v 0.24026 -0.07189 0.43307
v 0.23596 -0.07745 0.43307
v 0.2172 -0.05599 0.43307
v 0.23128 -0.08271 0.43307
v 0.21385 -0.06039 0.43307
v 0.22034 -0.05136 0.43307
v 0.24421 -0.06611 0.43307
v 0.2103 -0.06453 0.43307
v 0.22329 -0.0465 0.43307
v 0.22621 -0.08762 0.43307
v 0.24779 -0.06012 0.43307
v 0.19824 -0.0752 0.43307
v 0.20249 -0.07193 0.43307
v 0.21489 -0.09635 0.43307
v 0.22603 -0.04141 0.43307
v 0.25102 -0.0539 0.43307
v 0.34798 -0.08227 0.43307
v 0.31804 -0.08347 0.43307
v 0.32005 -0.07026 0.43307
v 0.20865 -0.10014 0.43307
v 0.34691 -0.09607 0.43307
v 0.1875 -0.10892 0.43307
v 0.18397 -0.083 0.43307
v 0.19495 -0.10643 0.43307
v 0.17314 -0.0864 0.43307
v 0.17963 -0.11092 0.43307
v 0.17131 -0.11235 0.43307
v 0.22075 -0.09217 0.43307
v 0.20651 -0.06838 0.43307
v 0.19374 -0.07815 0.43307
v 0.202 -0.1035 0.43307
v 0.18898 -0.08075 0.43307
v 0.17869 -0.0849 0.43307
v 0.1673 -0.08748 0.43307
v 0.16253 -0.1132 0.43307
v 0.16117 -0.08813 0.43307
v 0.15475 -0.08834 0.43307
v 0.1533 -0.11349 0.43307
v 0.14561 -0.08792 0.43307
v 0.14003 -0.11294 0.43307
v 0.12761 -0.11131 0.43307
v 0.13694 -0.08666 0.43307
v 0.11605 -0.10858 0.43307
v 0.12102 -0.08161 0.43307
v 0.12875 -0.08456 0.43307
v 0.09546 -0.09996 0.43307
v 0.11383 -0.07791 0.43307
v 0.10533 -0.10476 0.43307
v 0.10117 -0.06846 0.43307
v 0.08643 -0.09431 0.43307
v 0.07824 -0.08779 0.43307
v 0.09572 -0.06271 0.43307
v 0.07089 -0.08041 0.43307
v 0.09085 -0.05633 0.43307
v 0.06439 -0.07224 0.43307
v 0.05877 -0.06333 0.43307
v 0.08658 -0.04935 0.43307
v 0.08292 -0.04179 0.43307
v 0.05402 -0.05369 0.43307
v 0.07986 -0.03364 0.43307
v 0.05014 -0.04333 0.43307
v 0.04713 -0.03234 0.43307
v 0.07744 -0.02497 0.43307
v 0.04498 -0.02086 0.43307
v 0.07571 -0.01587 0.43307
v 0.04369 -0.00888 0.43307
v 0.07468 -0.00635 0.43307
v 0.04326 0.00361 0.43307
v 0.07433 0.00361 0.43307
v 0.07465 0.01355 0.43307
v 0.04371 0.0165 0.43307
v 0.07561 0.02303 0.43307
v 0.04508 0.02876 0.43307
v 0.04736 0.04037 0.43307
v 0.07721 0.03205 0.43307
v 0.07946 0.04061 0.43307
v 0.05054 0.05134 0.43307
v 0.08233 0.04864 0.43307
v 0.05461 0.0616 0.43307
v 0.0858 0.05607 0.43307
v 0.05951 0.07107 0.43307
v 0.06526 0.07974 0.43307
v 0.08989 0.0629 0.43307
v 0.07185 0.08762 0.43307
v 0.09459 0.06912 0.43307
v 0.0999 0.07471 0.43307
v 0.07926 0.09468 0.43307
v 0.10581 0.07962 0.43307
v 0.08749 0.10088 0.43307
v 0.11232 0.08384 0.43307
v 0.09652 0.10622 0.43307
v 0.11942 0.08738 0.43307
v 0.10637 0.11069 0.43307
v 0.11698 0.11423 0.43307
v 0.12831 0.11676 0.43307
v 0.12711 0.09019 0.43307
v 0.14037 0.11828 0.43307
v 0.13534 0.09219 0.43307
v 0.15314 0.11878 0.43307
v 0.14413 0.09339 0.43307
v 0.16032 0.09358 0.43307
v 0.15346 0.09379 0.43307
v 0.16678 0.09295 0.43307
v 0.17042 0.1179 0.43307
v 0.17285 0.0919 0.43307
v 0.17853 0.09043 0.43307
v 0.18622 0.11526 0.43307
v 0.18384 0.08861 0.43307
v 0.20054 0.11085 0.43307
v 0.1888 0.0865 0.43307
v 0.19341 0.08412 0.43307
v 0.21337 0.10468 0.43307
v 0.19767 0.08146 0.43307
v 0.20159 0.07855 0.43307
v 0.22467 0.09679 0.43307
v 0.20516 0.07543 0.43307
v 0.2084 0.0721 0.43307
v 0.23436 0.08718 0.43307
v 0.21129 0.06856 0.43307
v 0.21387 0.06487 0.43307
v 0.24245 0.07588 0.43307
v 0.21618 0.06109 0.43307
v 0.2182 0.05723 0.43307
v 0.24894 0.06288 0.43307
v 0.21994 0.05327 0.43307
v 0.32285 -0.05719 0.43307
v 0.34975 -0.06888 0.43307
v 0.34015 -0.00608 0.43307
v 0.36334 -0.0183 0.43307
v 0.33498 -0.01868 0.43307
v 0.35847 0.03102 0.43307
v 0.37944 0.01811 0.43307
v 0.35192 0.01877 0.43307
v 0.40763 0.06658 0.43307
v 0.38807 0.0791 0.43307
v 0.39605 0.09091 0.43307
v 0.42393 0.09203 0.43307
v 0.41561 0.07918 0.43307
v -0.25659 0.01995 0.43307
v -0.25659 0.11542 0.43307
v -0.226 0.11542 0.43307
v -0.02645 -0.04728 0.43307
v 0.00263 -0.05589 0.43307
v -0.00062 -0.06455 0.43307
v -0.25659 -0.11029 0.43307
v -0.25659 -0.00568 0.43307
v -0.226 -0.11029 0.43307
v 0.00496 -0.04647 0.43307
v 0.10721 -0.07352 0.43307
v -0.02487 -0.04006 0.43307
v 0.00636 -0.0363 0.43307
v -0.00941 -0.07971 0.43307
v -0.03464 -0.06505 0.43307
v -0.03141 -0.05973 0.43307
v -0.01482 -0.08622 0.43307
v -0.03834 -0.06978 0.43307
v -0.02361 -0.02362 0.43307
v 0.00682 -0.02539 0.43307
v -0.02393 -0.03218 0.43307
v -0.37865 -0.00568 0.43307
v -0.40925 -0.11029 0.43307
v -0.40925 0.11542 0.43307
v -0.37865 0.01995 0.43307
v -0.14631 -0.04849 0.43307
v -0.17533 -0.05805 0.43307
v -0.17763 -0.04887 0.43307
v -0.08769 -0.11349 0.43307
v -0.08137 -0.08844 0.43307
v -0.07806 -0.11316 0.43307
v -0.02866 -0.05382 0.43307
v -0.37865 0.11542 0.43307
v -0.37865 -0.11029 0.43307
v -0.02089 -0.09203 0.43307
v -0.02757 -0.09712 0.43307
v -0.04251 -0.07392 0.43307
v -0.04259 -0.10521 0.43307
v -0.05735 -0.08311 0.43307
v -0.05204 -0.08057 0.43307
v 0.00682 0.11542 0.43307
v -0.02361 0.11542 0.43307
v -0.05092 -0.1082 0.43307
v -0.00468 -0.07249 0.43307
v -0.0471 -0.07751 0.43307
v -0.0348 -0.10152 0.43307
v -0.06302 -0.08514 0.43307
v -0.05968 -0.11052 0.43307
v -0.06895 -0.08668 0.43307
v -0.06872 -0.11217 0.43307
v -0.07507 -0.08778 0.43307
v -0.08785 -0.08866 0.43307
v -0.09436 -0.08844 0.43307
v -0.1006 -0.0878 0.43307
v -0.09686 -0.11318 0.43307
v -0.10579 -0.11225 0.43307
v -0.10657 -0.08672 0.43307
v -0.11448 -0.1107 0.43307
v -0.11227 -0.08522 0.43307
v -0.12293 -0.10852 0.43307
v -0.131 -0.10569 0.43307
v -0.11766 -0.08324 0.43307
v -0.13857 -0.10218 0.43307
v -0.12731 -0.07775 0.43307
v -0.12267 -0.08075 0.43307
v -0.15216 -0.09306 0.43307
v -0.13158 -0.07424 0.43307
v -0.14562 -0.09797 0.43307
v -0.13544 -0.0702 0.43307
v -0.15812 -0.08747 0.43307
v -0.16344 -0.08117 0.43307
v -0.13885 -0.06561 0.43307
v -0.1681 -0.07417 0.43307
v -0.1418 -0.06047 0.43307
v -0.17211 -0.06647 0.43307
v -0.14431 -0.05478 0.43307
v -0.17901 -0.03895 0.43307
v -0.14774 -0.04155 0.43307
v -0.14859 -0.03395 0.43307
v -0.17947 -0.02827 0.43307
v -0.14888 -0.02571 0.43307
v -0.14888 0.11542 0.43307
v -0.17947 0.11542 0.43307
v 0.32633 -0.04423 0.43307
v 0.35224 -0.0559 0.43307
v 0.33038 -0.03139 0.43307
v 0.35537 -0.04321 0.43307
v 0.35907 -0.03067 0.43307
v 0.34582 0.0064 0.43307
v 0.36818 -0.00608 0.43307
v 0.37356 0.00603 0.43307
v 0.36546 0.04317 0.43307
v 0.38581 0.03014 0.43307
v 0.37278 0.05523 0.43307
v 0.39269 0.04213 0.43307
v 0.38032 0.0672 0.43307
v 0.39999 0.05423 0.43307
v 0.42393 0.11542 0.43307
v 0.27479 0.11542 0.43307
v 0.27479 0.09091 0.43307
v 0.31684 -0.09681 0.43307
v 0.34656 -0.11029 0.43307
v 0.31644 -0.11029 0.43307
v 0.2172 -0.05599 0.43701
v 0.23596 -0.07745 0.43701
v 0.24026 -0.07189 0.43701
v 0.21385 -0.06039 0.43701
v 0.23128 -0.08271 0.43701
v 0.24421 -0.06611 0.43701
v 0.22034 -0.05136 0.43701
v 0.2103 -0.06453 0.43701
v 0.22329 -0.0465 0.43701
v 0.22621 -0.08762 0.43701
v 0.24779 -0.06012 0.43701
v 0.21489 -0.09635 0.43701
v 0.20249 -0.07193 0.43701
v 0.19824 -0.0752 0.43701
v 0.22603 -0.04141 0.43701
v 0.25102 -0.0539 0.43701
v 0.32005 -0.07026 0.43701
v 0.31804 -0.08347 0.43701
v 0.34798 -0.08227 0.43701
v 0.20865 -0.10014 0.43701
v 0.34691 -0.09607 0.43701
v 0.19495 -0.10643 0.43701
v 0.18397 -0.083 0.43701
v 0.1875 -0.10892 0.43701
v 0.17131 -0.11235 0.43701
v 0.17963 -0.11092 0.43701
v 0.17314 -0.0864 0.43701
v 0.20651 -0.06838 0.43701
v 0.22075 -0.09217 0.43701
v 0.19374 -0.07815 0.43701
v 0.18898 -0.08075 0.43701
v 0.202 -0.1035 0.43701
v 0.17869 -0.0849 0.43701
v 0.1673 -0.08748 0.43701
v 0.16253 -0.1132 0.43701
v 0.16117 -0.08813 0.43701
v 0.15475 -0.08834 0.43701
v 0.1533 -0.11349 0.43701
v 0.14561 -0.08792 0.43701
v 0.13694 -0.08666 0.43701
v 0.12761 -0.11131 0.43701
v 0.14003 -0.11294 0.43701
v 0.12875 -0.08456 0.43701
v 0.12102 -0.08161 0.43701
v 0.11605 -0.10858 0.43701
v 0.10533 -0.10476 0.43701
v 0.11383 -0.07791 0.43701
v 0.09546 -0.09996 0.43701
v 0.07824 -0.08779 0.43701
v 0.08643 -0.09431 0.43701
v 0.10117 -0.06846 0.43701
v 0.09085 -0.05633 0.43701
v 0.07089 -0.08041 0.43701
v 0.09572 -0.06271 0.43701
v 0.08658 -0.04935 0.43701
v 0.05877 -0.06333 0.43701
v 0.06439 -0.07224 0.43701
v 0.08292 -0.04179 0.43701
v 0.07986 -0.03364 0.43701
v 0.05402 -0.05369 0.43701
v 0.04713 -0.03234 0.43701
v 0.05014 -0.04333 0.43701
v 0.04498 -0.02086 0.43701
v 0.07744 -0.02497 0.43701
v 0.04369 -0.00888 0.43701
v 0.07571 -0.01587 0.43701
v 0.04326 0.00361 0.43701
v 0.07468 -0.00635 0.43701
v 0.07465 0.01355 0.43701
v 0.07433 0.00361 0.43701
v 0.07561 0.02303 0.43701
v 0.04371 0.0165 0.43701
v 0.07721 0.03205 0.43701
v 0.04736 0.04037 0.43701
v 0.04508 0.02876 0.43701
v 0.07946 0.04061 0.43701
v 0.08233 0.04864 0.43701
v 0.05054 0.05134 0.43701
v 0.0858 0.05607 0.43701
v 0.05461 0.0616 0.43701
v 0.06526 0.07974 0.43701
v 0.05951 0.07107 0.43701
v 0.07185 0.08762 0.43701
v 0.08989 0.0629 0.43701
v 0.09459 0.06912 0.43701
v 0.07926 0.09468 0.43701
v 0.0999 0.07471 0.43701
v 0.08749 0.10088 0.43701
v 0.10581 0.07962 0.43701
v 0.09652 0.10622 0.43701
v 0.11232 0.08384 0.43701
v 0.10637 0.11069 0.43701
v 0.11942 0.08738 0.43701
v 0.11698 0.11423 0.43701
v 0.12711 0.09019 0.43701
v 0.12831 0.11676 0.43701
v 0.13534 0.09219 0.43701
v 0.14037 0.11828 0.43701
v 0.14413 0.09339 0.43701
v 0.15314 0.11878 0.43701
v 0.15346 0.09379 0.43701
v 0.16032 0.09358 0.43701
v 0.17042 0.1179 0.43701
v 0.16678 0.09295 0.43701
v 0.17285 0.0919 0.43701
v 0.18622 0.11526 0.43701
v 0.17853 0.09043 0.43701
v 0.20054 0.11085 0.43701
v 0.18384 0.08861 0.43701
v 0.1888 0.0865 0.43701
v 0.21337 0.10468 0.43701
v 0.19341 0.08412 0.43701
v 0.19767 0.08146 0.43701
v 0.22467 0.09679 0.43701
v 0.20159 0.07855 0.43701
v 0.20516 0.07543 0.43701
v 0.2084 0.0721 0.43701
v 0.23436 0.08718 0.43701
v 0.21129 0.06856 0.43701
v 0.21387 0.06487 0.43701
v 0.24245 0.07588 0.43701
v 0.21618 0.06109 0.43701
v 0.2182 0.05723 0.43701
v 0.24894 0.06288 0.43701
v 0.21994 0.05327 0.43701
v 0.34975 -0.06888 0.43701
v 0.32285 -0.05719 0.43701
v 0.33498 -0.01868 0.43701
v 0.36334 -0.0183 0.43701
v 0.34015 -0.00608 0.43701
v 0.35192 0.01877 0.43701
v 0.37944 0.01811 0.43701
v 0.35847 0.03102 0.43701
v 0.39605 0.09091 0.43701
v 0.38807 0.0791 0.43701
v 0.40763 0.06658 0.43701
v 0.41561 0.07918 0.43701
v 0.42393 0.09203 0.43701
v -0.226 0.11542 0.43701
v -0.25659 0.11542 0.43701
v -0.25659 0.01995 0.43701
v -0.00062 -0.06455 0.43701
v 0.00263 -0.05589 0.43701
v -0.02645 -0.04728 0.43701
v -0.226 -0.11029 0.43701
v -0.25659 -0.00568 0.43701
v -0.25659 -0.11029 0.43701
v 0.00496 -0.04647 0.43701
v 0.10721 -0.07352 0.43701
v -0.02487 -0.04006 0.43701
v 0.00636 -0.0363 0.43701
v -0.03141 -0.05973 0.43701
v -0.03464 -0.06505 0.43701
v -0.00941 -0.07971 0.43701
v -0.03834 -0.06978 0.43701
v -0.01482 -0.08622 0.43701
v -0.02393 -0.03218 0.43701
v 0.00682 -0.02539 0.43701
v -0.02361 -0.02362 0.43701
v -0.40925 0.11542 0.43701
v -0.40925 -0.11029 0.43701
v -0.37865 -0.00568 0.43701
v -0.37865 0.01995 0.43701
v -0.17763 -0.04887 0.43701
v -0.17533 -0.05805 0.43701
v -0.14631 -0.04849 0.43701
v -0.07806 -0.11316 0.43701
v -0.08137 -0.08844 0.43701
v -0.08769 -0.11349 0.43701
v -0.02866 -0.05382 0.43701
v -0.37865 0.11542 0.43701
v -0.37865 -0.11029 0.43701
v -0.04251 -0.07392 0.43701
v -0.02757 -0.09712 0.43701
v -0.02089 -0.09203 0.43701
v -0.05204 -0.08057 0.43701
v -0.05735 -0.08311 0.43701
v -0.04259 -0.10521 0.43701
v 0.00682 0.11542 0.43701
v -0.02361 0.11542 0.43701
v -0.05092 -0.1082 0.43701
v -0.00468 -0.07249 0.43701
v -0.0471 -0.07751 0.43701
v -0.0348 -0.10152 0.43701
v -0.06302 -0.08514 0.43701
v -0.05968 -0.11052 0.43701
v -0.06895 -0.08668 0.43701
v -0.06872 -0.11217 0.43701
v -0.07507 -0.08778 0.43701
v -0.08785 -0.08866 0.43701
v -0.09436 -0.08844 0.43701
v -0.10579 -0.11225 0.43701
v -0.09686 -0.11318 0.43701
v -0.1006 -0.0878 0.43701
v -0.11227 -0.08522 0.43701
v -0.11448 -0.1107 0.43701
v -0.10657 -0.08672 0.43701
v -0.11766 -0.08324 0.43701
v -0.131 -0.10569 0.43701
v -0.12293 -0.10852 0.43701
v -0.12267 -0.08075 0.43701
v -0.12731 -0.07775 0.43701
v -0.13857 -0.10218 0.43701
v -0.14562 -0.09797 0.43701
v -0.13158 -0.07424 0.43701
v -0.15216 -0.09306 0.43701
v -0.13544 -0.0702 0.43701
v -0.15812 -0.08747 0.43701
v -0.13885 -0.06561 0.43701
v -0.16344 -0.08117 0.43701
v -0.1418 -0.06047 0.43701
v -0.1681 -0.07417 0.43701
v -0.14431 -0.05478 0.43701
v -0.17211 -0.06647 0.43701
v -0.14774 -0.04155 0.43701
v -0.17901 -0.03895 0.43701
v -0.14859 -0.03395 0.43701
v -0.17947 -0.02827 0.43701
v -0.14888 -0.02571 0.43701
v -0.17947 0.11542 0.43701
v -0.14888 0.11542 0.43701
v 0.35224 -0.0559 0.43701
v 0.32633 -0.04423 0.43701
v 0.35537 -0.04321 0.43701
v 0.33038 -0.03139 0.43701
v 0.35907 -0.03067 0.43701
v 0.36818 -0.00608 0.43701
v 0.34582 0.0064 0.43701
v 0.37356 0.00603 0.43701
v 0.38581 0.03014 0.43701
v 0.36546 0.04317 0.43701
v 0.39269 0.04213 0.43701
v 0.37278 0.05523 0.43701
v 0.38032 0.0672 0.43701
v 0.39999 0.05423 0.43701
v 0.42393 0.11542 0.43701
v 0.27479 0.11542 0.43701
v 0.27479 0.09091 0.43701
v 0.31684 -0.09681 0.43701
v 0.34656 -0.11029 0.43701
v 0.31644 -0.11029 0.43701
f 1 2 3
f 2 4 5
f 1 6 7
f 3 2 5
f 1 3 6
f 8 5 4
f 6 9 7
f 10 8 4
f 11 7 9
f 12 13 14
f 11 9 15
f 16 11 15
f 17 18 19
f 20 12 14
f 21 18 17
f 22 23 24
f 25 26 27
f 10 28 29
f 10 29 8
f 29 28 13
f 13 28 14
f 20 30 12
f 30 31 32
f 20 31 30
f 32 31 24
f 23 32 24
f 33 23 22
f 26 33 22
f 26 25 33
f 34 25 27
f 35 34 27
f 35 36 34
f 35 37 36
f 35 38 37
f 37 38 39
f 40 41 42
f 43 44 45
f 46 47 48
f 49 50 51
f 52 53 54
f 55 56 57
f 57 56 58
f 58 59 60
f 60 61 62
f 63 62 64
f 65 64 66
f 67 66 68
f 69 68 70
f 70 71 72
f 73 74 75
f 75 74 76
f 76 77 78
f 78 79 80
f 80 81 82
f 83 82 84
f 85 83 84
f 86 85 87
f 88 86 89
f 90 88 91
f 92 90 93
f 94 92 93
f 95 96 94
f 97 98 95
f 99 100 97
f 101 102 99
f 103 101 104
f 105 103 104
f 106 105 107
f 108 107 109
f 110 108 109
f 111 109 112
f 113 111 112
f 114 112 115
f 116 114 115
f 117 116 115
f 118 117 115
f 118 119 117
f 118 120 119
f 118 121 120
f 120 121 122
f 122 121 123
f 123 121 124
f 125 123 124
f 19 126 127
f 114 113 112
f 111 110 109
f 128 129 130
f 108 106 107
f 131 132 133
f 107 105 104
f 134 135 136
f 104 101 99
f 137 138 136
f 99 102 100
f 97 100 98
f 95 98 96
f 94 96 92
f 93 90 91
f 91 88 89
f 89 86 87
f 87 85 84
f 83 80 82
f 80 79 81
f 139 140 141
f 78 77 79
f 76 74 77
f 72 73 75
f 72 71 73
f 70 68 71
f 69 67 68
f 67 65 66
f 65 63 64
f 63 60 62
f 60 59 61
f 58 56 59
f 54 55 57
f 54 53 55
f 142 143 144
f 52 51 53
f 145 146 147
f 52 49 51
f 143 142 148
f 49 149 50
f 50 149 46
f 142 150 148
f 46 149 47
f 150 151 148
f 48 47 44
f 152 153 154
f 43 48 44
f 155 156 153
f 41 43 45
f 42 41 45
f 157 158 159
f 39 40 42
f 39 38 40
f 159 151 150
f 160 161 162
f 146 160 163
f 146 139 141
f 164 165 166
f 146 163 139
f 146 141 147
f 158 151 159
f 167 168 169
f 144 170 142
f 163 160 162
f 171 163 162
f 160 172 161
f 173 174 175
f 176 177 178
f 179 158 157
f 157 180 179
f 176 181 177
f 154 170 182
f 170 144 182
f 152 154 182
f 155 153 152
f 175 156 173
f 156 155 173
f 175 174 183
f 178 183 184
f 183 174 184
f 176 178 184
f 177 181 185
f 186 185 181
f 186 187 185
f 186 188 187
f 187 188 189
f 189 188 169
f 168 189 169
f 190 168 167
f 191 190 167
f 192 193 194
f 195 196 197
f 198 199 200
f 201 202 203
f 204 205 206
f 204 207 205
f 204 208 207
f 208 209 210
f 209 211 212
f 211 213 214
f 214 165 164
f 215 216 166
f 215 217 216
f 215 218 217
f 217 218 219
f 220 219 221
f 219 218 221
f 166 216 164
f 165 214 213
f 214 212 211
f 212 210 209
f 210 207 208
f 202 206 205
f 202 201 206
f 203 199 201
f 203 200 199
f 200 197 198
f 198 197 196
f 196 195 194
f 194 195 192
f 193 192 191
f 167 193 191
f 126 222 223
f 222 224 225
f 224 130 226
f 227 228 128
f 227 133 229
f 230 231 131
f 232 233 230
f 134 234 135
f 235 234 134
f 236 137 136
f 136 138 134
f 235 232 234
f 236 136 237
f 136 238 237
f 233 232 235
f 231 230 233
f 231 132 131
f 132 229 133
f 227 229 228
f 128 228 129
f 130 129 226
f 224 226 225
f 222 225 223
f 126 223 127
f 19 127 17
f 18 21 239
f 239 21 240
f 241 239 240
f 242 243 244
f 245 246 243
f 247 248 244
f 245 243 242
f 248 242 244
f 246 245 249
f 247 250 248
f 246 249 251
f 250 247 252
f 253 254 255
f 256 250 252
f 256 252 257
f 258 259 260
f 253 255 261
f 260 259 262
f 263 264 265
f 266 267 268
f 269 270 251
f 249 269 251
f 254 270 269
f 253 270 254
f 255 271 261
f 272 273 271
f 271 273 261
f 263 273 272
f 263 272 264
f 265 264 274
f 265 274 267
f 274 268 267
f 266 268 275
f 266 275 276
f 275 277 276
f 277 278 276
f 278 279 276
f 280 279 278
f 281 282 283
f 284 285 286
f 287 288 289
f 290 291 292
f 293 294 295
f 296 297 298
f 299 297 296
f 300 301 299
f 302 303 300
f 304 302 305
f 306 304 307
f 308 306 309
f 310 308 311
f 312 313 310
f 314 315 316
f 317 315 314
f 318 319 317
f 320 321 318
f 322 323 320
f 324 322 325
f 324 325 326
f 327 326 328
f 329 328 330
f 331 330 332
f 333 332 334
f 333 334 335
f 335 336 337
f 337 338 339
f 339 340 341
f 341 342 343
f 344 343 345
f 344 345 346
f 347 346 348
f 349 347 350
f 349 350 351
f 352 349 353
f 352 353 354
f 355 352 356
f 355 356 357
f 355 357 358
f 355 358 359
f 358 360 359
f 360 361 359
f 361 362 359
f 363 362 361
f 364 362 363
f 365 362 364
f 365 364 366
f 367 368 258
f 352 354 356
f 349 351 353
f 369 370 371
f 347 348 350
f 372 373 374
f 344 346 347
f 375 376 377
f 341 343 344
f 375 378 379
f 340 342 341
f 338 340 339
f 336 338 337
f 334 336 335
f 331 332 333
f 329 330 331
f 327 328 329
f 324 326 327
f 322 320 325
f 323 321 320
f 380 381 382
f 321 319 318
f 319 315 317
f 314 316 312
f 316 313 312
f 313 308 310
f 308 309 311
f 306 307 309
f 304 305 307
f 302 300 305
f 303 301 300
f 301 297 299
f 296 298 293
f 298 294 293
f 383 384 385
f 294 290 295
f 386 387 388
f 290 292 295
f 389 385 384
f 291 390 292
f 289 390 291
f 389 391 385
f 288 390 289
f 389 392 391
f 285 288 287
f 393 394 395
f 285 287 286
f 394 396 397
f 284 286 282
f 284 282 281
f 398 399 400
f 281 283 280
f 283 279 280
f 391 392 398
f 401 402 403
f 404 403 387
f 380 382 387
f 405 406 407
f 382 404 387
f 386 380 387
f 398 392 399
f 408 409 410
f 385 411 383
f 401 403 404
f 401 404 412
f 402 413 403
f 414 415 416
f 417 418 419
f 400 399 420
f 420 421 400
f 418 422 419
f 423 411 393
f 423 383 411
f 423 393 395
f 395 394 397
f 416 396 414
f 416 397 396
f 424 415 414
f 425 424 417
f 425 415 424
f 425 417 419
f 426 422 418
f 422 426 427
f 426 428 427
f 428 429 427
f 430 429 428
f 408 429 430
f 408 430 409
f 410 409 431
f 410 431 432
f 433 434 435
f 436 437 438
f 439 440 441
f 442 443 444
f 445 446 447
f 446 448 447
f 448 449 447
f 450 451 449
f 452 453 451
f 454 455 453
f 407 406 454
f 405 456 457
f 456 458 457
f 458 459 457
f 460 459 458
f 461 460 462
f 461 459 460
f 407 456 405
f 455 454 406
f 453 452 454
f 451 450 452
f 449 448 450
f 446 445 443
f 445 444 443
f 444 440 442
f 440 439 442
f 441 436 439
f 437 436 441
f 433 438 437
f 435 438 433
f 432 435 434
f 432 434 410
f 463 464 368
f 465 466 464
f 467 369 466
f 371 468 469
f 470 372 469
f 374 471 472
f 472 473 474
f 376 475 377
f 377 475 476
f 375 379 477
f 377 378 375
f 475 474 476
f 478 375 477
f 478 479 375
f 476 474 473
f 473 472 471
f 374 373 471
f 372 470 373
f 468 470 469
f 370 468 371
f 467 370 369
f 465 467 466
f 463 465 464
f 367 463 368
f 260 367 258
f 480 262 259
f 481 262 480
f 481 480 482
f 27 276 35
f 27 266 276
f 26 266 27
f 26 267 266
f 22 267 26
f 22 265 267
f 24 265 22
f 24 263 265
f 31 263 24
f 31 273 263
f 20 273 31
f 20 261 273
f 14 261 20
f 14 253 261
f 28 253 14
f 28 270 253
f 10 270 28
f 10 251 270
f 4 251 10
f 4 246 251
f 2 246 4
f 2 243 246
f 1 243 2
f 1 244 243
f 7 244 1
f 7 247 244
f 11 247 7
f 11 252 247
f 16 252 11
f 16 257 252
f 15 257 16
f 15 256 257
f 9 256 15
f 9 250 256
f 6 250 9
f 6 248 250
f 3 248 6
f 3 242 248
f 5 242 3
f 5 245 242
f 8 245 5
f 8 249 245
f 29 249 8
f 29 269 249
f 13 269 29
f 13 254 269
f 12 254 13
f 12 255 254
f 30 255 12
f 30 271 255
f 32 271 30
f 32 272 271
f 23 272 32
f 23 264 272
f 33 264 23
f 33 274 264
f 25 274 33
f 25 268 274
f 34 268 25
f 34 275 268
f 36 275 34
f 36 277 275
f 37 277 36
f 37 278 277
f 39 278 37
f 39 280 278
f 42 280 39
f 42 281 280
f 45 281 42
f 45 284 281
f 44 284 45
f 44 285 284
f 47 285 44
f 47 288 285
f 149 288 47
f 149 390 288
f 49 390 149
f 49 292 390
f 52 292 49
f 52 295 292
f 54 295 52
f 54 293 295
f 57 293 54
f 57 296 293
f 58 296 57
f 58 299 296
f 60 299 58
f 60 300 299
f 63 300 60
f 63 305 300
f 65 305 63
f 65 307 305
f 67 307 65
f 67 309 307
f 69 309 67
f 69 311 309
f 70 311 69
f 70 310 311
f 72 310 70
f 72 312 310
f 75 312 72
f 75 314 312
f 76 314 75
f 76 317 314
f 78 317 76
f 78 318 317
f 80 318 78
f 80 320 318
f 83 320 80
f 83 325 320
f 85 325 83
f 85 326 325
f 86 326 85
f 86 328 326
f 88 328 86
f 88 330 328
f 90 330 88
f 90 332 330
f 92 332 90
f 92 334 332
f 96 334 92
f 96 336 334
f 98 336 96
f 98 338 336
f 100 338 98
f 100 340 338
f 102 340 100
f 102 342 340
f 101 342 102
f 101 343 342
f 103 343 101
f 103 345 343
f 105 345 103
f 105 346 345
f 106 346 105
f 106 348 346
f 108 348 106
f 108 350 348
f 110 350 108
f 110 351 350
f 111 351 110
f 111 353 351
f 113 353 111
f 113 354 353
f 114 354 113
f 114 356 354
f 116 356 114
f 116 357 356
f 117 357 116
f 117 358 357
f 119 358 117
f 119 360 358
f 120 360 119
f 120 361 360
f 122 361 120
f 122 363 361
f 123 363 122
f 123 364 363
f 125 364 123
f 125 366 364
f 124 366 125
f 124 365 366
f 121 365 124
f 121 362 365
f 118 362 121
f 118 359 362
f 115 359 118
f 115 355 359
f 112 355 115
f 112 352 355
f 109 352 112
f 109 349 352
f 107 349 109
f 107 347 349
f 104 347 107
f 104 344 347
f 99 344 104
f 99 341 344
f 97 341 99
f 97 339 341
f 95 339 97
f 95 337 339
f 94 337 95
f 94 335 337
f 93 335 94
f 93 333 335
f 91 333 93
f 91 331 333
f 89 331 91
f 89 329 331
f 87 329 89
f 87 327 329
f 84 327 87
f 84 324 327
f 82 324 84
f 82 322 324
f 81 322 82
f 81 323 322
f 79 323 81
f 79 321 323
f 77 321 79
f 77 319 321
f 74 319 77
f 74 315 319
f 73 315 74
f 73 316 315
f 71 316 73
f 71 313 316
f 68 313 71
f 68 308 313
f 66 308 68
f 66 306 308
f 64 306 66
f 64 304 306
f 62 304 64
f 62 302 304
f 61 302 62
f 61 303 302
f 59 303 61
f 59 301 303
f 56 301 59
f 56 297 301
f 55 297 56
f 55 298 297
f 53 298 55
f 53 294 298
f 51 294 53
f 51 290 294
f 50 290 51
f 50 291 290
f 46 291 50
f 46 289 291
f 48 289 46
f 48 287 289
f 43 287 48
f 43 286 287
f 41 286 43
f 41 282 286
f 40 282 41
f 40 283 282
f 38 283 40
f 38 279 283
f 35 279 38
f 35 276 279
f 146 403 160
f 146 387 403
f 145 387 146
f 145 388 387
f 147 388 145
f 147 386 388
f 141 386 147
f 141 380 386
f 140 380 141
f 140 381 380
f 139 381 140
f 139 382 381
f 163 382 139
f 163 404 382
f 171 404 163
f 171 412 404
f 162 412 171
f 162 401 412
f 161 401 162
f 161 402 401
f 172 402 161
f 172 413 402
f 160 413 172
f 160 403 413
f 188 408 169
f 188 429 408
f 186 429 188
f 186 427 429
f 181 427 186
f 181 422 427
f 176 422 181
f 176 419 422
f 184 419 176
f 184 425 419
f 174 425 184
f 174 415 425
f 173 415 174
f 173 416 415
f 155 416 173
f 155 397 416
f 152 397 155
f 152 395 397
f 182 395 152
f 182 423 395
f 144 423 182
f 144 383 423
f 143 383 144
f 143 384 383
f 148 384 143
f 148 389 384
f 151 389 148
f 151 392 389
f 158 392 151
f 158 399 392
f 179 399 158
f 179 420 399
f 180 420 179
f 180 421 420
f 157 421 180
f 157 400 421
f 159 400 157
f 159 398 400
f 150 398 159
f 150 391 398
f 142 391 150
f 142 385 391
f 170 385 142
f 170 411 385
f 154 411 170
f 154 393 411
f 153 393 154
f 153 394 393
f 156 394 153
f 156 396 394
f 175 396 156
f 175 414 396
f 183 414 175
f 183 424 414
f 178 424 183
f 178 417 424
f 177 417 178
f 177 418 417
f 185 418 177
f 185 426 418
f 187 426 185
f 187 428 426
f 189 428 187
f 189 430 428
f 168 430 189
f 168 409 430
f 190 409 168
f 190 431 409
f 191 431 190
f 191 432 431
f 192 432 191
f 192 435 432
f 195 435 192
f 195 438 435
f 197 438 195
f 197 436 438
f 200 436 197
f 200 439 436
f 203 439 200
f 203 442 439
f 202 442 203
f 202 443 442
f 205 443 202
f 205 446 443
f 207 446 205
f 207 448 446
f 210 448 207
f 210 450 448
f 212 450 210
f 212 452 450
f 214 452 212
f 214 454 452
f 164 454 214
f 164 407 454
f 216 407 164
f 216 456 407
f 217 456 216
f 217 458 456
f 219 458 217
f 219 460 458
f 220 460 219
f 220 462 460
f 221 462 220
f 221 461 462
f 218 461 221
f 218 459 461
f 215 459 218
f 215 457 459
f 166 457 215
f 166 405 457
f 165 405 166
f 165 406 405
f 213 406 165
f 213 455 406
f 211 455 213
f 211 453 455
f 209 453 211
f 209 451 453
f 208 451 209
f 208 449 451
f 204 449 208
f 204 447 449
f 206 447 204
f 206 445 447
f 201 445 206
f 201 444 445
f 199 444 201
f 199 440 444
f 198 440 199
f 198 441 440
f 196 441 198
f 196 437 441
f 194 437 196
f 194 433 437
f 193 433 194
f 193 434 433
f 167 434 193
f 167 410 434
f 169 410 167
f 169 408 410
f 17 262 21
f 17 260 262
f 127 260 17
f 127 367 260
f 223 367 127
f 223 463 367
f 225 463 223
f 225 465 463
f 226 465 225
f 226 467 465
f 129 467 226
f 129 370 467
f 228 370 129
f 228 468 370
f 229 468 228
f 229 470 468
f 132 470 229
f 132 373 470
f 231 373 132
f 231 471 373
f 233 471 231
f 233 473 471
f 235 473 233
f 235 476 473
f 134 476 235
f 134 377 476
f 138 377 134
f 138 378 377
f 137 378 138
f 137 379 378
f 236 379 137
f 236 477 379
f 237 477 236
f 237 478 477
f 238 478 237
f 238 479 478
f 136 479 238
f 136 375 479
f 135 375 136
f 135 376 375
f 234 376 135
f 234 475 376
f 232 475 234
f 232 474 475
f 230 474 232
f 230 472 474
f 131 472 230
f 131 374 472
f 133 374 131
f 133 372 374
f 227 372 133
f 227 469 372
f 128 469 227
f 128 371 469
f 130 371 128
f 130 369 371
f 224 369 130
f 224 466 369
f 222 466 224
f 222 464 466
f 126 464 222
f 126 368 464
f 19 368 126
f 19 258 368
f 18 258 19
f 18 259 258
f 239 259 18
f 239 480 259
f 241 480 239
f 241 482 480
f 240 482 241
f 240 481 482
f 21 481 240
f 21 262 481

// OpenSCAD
// file: defines.scad
e = 0.95;    // Шаг выводов
e1 = 1.90;

/*A  = 1.00;  // 0.89..1.45*/
A2 = 1.00; // 0.90..1.30
A1 = 0.10; // 0.00..0.15
A = A1 + A2;
E  = 2.50; // 2.10..3.00
E1 = 1.70; // 1.20..1.80
D  = 3.10; // 2.70..3.10
L  = 0.30; // 0.15..0.60
fi = 20.0; // 0.00..30.00
c  = 0.15; // 0.09..0.26
b  = 0.40; // 0.30..0.51



scale = 1/2.54;
// main file
include <defines.scad>

font = "Liberation Sans";
/*font = "DejaVu";*/
/*font = "Abyssinica SIL";*/

lab_h = 0.01;

/*$fn = 64;*/

// Label
scale(scale) color("Gray")  {

    translate([0, 0, A]) {
      linear_extrude(height = lab_h, center=false)
      scale(0.06)
      text("HUC7", font = font, valign="center", halign="center");
    }

}
